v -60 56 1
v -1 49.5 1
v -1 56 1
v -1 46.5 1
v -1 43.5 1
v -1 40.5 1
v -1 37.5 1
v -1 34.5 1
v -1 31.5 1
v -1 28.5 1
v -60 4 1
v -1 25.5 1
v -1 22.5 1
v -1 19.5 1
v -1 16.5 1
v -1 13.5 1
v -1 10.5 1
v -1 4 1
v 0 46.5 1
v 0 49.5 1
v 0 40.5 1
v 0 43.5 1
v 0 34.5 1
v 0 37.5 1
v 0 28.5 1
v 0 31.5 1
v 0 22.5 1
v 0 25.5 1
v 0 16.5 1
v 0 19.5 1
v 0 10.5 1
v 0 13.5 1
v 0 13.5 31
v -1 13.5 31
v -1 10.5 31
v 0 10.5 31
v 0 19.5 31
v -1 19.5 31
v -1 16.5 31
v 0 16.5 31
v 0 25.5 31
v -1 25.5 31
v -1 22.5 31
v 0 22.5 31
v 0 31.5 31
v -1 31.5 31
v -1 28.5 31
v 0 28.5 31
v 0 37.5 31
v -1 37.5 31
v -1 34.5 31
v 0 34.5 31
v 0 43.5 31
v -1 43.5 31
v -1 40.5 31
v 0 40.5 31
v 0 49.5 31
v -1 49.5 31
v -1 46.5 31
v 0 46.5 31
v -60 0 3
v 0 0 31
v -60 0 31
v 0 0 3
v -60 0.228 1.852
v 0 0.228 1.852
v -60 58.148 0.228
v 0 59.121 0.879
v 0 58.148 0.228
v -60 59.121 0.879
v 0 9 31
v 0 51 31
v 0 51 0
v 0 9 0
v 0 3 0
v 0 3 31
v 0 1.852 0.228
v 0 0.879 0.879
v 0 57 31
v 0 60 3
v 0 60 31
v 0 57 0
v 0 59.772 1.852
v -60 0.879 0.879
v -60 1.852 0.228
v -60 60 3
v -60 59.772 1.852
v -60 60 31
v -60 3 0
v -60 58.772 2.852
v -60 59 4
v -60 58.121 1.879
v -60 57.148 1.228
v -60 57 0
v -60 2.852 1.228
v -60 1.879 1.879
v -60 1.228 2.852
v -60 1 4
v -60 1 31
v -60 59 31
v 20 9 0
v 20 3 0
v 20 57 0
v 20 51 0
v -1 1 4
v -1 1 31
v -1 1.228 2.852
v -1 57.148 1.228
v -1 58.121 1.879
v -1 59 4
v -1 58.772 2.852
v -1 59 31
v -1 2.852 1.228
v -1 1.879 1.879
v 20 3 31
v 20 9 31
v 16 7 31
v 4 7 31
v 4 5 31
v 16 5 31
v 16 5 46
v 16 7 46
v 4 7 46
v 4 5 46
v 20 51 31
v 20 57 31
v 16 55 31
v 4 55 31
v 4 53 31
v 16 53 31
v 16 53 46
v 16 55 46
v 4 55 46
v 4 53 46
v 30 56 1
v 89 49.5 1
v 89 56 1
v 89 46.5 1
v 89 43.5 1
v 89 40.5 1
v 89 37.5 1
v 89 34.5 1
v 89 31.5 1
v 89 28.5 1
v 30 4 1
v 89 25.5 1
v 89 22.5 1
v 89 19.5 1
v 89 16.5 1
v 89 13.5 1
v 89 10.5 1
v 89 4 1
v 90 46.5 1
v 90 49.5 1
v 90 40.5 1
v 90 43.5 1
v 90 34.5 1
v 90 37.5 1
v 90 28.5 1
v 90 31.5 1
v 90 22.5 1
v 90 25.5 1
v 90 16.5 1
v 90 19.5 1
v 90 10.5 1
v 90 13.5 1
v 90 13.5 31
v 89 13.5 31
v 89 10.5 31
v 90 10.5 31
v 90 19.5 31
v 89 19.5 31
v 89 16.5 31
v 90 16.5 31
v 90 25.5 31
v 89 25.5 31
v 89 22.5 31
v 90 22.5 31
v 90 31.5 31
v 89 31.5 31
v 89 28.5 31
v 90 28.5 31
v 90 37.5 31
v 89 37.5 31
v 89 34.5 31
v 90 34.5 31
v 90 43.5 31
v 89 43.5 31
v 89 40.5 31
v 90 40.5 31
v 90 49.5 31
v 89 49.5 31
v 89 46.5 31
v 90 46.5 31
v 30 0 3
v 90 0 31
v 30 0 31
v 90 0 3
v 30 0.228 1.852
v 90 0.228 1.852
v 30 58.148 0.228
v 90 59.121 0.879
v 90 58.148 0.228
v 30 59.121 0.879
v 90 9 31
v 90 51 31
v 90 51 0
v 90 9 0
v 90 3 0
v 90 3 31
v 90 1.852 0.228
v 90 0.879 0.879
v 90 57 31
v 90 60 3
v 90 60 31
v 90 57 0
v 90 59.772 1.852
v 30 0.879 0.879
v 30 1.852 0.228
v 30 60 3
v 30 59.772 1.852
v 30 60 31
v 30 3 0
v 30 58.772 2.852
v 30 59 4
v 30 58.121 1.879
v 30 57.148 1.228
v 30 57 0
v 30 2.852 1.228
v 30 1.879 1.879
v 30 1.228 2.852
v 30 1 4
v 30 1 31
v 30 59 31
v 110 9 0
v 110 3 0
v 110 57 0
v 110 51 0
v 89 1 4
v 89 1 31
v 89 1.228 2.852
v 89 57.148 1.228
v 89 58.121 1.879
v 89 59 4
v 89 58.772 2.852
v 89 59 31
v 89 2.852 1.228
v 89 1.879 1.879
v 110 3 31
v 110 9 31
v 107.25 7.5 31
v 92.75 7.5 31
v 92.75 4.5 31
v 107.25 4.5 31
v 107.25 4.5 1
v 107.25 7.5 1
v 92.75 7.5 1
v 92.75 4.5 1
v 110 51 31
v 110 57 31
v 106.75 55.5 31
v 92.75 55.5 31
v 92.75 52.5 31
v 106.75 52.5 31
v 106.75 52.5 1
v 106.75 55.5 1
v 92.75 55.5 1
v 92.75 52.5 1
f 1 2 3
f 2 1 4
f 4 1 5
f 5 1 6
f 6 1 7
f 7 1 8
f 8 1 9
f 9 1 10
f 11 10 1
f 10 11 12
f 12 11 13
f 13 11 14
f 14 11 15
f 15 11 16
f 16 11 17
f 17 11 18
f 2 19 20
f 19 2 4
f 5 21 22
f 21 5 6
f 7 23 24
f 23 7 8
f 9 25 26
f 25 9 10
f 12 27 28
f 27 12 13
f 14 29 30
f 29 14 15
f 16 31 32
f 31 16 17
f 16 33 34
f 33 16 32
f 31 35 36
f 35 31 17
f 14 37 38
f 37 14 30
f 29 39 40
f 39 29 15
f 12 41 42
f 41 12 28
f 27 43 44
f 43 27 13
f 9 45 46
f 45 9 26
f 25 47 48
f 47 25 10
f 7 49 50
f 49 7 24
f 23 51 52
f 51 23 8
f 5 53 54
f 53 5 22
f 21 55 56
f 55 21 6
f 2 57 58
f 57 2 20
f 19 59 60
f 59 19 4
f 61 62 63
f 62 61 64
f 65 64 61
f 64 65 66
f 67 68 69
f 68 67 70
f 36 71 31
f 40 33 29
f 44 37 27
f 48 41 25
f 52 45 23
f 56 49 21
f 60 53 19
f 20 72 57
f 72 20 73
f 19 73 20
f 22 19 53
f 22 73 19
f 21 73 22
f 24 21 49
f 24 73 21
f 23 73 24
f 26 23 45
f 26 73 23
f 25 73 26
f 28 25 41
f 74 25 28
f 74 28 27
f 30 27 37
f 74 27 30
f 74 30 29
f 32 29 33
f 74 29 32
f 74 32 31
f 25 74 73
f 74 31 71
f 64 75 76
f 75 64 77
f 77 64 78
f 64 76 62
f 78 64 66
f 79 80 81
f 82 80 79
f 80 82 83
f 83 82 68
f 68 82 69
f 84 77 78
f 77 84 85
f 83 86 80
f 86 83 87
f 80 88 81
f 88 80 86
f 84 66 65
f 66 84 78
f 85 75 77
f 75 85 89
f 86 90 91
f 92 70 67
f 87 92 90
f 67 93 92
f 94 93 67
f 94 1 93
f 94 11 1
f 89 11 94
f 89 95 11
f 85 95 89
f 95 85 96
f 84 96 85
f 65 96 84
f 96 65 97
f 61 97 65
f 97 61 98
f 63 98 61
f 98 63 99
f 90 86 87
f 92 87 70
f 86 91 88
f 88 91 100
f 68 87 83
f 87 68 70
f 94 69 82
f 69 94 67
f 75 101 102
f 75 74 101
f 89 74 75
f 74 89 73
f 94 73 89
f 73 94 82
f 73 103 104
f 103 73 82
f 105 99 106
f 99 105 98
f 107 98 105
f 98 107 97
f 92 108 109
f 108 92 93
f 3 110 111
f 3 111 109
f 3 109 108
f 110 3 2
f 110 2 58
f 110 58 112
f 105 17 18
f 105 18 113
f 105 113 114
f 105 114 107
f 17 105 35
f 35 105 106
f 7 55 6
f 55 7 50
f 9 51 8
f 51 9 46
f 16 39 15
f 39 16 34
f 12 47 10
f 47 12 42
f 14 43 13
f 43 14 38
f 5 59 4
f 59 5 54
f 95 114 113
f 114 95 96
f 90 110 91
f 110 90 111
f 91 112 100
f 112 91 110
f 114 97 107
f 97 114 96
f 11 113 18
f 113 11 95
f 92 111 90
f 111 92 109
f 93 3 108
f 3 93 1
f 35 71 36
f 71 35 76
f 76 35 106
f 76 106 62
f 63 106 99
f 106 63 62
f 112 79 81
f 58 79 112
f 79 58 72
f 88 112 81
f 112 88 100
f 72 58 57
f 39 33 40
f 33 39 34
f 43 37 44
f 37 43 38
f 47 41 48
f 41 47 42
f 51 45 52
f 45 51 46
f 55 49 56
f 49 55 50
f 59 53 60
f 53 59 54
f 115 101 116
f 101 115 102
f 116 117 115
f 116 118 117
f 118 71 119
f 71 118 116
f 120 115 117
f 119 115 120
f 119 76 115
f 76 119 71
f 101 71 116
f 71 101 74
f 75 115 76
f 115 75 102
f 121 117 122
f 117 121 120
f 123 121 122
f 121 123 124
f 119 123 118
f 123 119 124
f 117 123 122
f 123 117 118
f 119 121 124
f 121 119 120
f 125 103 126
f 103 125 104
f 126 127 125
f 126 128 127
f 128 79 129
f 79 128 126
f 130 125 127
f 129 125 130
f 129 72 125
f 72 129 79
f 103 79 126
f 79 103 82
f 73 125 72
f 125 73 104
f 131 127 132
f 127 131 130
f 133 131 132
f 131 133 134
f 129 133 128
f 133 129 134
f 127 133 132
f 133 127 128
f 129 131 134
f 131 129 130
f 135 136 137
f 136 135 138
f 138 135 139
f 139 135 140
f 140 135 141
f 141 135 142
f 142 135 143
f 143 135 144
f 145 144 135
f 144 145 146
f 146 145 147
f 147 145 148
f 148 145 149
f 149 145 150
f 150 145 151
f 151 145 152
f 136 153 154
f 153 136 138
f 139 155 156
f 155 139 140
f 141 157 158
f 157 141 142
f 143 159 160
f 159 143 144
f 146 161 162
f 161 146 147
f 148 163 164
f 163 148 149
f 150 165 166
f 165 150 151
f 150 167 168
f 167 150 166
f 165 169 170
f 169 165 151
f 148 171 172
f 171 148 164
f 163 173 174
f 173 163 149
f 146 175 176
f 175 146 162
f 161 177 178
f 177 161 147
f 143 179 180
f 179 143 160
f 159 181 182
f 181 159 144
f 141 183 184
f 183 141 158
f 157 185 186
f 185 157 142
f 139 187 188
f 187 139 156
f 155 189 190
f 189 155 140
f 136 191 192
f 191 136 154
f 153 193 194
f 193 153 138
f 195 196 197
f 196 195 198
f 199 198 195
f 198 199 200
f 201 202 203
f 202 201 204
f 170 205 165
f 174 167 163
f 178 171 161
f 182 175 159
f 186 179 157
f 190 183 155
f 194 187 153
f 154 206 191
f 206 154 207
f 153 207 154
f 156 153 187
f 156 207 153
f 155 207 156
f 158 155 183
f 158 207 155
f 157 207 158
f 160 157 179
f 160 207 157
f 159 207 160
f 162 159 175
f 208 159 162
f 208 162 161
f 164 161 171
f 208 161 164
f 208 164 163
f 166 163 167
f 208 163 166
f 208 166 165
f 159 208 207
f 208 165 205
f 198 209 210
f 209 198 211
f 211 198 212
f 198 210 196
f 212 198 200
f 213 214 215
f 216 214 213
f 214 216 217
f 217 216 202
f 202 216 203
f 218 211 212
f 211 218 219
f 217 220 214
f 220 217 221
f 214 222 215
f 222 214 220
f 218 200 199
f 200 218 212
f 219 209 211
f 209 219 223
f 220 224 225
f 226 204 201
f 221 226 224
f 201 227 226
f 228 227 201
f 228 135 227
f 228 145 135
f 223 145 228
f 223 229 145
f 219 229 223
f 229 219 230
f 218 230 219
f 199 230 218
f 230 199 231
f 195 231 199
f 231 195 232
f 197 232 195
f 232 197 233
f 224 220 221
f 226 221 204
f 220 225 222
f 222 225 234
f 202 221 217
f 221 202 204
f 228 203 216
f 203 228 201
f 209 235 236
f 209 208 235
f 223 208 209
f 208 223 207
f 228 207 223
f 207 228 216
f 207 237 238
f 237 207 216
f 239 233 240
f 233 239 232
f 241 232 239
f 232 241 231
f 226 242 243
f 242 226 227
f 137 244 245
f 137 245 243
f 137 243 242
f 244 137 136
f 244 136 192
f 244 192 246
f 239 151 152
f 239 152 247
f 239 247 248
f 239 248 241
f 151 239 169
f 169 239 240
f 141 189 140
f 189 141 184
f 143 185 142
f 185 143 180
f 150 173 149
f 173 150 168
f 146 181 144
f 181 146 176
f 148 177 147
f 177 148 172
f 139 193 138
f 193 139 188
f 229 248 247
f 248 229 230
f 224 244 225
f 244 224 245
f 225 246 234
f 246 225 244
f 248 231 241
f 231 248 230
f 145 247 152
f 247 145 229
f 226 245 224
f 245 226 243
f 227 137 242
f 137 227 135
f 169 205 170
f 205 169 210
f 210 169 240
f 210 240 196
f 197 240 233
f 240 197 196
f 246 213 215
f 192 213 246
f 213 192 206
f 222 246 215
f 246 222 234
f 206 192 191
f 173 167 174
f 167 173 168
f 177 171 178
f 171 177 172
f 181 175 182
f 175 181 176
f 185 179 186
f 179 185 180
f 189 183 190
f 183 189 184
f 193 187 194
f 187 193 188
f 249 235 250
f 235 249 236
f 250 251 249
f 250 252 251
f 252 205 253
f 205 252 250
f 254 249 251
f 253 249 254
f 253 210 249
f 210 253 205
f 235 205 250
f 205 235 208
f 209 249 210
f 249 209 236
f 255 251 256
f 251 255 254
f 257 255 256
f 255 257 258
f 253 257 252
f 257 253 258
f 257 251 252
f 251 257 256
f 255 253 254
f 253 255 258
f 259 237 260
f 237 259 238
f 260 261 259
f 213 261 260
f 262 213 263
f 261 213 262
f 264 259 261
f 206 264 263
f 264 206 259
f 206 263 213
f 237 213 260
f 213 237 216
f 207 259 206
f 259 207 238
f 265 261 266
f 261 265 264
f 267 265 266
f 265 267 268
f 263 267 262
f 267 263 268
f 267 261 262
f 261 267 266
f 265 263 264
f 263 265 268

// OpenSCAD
$fn = 16;

module rounded_box(size = [ 10, 10, 5 ], r = 3) {
  translate([ size[0] / 2, size[1] / 2, 0 ]) {
    linear_extrude(height = size[2]) {
      minkowski() {
        square([ size[0] - 2 * r, size[1] - 2 * r ], center = true);
        circle(r = r);
      }
    }
  }
}

module inner_shell_a() {
  height = 60;
  wall = 1;
  rotate([0,-90,0]) difference() {
    rounded_box([height,height,height]);
    translate([wall, wall, wall]) rounded_box([height - wall*2, height - wall*2,height + wall*2]);

    translate([wall+height/2,-wall,-wall]) cube([height,height+wall*2,height*2]);

    for (i = [10.5 : 6 : 50]) {
      translate([wall, wall * i, -wall])
        cube([height, 3, height]);
    }
  }

  radius = 3;
  leg_width = 6;
  leg_length = 20;

  pin_width = 2;
  pin_height = height/2+wall+height/4;
  pin_length = leg_length-8;

  translate([0,radius,0]) cube([20,leg_width,height/2+wall]);
  translate([(leg_length - pin_length)/2,radius + (leg_width - pin_width)/2,0]) cube([pin_length,pin_width,pin_height]);

  translate([0,height-radius-leg_width,0]) cube([20,leg_width,height/2+wall]);
  translate([
  (leg_length - pin_length)/2,
  height - radius - (leg_width - pin_width)/2-pin_width,
  0]) 
    cube([pin_length,pin_width,height/2+wall+height/4]);
}

module inner_shell_b() {
  height = 60;
  wall = 1;

  rotate([0,-90,0]) difference() {
    rounded_box([height,height,height]);
    translate([wall, wall, wall]) rounded_box([height - wall*2, height - wall*2,height + wall*2]);

    translate([wall+height/2,-wall,-wall]) cube([height,height+wall*2,height*2]);

    for (i = [10.5 : 6 : 50]) {
      translate([wall, wall * i, -wall])
        cube([height, 3, height]);
    }
  }

  radius = 3;
  leg_width = 6;
  leg_length = 20;
  
  pin_width = 3;
  pin_height = height/2+wall+height/4;
  pin_length = leg_length-6+0.5;
  
  difference() {
    translate([0,radius,0]) cube([20,leg_width,height/2+wall]);
    translate([(leg_length - pin_length)/2,radius + (leg_width - pin_width)/2,wall]) cube([pin_length,pin_width,pin_height]);
  }

  difference() {
    translate([0,height-radius-leg_width,0]) cube([20,leg_width,height/2+wall]);
    translate([(leg_length - pin_length)/2,height - radius - (leg_width - pin_width)/2-pin_width,wall]) cube([20-6,pin_width,pin_height]);
  }
}

module outer_shell() {
  height = 60+20;
  spacer = 4;
  edge = 60 + spacer;
  wall = 1;

  difference() {
    rounded_box([edge,edge,height]);
    translate([wall, wall, wall]) rounded_box([edge - wall*2, edge - wall*2,height + wall*2]);
  }

  difference() {
   translate([0,(edge+wall*2)/2,0]) cube([spacer,1, height/2]);
   translate([4,(edge+wall*2)/2- 0.05,1]) rotate([0,-3,0]) cube([spacer,1.1, height]);
  }

  difference() {
   translate([edge-spacer,edge/2,0]) cube([spacer,1, height/2]);
   translate([edge - spacer - 4,edge/2- 0.05,1]) rotate([0,3,0]) cube([spacer,1.1, height]);
  }

  difference() {
   translate([(edge)/2,edge-spacer,0]) cube([1,spacer, height/2]);
   translate([edge/2- 0.05,edge-spacer - 4,1]) rotate([-3,0,0]) cube([1.1,spacer, height]);
  }

  difference() {
   translate([(edge)/2,0,0]) cube([1,spacer, height/2]);
   translate([edge/2-0.05,4,1]) rotate([3,0,0]) cube([1.1,spacer, height]);
  }
}


inner_shell_a();
translate([90, 0,0]) inner_shell_b();

//translate([120,0,0]) outer_shell();
